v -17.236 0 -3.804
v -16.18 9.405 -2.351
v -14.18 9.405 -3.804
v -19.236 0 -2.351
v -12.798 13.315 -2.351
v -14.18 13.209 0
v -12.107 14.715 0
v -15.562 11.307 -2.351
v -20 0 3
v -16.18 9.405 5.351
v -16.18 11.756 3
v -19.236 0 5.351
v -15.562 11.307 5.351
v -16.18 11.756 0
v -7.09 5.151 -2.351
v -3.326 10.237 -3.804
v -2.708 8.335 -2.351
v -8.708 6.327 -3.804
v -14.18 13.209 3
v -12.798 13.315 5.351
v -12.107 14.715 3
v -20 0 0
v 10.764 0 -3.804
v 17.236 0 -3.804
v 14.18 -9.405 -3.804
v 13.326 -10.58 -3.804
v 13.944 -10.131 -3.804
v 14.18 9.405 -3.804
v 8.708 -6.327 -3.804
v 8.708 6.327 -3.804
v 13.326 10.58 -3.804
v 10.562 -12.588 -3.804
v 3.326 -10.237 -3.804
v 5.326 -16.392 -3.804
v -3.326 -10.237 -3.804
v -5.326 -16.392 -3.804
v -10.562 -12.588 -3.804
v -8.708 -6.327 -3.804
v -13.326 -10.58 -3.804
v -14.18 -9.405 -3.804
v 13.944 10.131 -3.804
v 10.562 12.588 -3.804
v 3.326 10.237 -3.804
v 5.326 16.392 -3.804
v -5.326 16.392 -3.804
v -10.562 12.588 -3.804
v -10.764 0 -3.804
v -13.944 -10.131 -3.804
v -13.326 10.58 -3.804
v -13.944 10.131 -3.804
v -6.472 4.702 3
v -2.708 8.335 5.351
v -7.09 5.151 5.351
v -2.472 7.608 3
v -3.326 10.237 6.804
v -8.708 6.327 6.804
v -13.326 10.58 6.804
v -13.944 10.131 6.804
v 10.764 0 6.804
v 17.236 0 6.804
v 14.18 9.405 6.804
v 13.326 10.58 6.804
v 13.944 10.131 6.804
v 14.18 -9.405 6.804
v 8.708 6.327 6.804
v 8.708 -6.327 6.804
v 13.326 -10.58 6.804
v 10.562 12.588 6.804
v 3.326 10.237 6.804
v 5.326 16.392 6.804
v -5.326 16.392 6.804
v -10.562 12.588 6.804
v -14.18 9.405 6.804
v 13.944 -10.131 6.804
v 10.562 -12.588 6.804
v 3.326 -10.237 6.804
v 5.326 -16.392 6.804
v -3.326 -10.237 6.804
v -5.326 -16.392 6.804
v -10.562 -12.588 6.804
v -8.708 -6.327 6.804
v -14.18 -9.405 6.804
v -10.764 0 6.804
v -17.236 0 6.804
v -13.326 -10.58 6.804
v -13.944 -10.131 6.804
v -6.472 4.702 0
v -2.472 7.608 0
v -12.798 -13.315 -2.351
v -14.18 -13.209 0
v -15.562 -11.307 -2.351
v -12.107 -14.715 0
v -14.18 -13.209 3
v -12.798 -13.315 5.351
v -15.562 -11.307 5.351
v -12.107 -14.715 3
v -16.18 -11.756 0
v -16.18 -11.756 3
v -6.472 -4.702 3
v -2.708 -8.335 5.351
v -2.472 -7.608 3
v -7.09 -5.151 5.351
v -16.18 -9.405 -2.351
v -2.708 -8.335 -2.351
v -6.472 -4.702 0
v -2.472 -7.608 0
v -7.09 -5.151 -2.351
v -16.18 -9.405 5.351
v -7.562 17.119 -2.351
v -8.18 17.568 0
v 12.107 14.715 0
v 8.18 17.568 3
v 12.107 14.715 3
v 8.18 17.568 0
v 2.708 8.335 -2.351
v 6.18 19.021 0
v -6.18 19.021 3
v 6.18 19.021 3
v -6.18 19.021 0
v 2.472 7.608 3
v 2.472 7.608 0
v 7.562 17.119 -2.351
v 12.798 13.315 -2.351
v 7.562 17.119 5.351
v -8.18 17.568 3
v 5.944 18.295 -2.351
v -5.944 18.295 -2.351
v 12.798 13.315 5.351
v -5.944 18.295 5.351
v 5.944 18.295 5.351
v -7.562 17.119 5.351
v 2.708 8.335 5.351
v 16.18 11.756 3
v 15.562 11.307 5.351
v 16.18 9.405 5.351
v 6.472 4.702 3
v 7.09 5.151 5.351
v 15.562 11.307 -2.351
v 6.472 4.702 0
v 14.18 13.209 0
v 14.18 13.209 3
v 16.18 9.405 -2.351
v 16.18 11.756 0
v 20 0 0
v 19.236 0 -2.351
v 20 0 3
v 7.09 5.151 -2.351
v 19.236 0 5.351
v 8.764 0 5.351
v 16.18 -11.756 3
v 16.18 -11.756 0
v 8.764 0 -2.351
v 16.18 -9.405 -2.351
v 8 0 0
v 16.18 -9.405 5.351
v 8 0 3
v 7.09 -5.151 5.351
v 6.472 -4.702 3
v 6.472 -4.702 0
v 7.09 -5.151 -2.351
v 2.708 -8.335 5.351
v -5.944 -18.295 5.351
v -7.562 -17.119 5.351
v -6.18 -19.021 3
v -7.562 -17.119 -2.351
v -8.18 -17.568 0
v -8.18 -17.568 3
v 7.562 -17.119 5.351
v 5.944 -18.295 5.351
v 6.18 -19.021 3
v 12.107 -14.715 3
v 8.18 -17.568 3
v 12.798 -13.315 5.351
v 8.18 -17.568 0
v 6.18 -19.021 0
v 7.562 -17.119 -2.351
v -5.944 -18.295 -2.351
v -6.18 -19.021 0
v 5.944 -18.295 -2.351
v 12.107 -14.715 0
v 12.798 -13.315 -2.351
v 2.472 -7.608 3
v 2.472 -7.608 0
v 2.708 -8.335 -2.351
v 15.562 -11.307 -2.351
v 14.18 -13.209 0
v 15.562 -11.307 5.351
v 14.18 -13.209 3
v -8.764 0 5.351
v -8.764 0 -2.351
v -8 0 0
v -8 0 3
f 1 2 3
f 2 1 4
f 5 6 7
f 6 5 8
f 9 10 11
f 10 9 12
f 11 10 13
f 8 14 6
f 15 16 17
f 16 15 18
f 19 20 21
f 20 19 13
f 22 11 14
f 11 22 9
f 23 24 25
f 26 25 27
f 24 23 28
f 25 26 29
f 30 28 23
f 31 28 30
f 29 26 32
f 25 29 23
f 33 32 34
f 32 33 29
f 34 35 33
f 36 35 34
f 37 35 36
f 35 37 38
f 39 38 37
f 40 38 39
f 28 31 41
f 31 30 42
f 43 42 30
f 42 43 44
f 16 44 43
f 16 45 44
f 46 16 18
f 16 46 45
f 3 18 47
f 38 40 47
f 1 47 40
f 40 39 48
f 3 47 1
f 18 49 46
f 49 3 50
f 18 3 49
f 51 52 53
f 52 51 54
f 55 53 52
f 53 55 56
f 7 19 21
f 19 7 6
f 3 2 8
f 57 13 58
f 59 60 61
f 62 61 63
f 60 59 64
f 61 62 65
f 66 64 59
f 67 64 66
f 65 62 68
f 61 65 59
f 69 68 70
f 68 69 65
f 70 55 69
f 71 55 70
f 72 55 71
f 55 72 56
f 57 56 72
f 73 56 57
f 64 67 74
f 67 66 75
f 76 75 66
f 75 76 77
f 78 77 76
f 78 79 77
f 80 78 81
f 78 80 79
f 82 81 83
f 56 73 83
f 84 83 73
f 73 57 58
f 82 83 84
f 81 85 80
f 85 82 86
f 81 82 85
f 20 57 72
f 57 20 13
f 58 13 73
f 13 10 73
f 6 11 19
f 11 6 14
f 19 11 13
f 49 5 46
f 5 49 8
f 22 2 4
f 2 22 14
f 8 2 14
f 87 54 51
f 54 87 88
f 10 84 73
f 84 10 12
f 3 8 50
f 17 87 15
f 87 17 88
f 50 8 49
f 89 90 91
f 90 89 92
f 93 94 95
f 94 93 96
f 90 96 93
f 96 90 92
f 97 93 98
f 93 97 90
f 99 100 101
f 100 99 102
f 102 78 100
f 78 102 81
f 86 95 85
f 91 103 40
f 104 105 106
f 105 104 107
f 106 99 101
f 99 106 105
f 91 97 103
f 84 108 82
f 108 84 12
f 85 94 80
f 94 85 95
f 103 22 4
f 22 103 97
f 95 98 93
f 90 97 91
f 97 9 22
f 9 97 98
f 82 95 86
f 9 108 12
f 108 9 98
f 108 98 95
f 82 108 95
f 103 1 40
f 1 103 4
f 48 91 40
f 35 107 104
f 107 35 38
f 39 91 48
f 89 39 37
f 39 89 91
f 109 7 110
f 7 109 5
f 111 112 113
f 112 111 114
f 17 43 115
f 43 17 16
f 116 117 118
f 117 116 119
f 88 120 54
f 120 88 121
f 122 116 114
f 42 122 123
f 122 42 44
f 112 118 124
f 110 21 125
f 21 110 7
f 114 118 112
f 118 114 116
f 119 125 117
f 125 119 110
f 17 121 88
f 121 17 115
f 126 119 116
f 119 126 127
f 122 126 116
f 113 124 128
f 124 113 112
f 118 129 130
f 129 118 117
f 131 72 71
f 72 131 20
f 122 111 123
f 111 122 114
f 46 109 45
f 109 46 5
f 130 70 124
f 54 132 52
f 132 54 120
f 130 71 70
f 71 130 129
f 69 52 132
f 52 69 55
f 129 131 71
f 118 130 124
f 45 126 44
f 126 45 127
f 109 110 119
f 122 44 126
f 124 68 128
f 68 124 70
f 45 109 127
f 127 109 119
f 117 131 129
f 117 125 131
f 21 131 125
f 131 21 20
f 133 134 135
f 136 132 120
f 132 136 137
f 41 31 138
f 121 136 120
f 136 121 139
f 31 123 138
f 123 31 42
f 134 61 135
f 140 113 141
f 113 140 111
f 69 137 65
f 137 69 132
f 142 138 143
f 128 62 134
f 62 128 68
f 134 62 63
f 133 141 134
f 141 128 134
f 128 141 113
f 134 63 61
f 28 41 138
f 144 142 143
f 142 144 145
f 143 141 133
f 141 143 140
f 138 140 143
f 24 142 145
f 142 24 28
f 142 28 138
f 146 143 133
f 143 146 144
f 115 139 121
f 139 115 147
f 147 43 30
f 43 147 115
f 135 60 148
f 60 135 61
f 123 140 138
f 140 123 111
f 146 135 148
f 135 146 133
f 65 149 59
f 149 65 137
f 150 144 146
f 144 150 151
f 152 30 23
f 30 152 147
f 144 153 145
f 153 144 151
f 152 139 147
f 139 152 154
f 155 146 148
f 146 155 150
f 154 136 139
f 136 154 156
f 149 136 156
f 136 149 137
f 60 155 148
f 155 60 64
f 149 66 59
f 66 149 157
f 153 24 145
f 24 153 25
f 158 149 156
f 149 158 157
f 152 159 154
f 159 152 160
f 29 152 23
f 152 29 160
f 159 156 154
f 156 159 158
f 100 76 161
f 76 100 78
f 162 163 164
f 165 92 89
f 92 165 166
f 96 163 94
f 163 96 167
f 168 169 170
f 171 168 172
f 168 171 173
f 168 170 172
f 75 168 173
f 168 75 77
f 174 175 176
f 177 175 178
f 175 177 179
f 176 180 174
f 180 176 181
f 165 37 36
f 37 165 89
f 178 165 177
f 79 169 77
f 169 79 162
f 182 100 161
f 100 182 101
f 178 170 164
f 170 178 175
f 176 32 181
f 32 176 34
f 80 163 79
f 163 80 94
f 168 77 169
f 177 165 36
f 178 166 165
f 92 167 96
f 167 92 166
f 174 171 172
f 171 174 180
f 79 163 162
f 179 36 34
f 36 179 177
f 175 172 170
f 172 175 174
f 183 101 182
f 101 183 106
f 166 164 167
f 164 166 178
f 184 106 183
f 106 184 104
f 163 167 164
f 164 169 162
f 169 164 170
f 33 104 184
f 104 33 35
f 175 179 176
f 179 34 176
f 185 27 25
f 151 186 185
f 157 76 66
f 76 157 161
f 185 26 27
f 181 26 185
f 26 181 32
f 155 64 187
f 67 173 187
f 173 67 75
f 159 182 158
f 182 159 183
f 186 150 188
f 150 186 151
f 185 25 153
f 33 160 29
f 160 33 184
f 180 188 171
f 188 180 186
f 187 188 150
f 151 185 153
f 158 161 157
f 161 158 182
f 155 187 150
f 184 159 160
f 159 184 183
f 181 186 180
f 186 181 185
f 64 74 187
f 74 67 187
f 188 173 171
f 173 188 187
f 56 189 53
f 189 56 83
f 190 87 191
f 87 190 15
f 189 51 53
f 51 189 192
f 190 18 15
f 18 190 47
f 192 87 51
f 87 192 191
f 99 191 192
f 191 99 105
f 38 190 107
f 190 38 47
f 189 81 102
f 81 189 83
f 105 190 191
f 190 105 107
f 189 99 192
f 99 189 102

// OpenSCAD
// Doing a minkowski sum between a donut and a sphere will
// take some time to render.  It's worth it in the quality
// of the final piece.

// The tower is designed to hold 7 rings varying in diameter
// from 40mm to 100mm.  But that's why you have the code!
// Mix it up with different sizes and colors.
$diameter = 40;

// This is a curvy piece.  The higher you make this number,
// the smoother it will be, but the longer it will take to
// render. 30 is OpenScad's default. Low values like 10
// turn into nice chunky shapes.
$quality = 10;

module ring(x) {
    minkowski() {  
      difference() {
        cylinder(r=x-4, h=3, $fn=$quality);
        translate([0,0,-5]){
          cylinder(r=12,h=20, $fn=$quality);
        }
      }   
      sphere(4, $fn=$quality);
    }
  }

ring($diameter / 2);
